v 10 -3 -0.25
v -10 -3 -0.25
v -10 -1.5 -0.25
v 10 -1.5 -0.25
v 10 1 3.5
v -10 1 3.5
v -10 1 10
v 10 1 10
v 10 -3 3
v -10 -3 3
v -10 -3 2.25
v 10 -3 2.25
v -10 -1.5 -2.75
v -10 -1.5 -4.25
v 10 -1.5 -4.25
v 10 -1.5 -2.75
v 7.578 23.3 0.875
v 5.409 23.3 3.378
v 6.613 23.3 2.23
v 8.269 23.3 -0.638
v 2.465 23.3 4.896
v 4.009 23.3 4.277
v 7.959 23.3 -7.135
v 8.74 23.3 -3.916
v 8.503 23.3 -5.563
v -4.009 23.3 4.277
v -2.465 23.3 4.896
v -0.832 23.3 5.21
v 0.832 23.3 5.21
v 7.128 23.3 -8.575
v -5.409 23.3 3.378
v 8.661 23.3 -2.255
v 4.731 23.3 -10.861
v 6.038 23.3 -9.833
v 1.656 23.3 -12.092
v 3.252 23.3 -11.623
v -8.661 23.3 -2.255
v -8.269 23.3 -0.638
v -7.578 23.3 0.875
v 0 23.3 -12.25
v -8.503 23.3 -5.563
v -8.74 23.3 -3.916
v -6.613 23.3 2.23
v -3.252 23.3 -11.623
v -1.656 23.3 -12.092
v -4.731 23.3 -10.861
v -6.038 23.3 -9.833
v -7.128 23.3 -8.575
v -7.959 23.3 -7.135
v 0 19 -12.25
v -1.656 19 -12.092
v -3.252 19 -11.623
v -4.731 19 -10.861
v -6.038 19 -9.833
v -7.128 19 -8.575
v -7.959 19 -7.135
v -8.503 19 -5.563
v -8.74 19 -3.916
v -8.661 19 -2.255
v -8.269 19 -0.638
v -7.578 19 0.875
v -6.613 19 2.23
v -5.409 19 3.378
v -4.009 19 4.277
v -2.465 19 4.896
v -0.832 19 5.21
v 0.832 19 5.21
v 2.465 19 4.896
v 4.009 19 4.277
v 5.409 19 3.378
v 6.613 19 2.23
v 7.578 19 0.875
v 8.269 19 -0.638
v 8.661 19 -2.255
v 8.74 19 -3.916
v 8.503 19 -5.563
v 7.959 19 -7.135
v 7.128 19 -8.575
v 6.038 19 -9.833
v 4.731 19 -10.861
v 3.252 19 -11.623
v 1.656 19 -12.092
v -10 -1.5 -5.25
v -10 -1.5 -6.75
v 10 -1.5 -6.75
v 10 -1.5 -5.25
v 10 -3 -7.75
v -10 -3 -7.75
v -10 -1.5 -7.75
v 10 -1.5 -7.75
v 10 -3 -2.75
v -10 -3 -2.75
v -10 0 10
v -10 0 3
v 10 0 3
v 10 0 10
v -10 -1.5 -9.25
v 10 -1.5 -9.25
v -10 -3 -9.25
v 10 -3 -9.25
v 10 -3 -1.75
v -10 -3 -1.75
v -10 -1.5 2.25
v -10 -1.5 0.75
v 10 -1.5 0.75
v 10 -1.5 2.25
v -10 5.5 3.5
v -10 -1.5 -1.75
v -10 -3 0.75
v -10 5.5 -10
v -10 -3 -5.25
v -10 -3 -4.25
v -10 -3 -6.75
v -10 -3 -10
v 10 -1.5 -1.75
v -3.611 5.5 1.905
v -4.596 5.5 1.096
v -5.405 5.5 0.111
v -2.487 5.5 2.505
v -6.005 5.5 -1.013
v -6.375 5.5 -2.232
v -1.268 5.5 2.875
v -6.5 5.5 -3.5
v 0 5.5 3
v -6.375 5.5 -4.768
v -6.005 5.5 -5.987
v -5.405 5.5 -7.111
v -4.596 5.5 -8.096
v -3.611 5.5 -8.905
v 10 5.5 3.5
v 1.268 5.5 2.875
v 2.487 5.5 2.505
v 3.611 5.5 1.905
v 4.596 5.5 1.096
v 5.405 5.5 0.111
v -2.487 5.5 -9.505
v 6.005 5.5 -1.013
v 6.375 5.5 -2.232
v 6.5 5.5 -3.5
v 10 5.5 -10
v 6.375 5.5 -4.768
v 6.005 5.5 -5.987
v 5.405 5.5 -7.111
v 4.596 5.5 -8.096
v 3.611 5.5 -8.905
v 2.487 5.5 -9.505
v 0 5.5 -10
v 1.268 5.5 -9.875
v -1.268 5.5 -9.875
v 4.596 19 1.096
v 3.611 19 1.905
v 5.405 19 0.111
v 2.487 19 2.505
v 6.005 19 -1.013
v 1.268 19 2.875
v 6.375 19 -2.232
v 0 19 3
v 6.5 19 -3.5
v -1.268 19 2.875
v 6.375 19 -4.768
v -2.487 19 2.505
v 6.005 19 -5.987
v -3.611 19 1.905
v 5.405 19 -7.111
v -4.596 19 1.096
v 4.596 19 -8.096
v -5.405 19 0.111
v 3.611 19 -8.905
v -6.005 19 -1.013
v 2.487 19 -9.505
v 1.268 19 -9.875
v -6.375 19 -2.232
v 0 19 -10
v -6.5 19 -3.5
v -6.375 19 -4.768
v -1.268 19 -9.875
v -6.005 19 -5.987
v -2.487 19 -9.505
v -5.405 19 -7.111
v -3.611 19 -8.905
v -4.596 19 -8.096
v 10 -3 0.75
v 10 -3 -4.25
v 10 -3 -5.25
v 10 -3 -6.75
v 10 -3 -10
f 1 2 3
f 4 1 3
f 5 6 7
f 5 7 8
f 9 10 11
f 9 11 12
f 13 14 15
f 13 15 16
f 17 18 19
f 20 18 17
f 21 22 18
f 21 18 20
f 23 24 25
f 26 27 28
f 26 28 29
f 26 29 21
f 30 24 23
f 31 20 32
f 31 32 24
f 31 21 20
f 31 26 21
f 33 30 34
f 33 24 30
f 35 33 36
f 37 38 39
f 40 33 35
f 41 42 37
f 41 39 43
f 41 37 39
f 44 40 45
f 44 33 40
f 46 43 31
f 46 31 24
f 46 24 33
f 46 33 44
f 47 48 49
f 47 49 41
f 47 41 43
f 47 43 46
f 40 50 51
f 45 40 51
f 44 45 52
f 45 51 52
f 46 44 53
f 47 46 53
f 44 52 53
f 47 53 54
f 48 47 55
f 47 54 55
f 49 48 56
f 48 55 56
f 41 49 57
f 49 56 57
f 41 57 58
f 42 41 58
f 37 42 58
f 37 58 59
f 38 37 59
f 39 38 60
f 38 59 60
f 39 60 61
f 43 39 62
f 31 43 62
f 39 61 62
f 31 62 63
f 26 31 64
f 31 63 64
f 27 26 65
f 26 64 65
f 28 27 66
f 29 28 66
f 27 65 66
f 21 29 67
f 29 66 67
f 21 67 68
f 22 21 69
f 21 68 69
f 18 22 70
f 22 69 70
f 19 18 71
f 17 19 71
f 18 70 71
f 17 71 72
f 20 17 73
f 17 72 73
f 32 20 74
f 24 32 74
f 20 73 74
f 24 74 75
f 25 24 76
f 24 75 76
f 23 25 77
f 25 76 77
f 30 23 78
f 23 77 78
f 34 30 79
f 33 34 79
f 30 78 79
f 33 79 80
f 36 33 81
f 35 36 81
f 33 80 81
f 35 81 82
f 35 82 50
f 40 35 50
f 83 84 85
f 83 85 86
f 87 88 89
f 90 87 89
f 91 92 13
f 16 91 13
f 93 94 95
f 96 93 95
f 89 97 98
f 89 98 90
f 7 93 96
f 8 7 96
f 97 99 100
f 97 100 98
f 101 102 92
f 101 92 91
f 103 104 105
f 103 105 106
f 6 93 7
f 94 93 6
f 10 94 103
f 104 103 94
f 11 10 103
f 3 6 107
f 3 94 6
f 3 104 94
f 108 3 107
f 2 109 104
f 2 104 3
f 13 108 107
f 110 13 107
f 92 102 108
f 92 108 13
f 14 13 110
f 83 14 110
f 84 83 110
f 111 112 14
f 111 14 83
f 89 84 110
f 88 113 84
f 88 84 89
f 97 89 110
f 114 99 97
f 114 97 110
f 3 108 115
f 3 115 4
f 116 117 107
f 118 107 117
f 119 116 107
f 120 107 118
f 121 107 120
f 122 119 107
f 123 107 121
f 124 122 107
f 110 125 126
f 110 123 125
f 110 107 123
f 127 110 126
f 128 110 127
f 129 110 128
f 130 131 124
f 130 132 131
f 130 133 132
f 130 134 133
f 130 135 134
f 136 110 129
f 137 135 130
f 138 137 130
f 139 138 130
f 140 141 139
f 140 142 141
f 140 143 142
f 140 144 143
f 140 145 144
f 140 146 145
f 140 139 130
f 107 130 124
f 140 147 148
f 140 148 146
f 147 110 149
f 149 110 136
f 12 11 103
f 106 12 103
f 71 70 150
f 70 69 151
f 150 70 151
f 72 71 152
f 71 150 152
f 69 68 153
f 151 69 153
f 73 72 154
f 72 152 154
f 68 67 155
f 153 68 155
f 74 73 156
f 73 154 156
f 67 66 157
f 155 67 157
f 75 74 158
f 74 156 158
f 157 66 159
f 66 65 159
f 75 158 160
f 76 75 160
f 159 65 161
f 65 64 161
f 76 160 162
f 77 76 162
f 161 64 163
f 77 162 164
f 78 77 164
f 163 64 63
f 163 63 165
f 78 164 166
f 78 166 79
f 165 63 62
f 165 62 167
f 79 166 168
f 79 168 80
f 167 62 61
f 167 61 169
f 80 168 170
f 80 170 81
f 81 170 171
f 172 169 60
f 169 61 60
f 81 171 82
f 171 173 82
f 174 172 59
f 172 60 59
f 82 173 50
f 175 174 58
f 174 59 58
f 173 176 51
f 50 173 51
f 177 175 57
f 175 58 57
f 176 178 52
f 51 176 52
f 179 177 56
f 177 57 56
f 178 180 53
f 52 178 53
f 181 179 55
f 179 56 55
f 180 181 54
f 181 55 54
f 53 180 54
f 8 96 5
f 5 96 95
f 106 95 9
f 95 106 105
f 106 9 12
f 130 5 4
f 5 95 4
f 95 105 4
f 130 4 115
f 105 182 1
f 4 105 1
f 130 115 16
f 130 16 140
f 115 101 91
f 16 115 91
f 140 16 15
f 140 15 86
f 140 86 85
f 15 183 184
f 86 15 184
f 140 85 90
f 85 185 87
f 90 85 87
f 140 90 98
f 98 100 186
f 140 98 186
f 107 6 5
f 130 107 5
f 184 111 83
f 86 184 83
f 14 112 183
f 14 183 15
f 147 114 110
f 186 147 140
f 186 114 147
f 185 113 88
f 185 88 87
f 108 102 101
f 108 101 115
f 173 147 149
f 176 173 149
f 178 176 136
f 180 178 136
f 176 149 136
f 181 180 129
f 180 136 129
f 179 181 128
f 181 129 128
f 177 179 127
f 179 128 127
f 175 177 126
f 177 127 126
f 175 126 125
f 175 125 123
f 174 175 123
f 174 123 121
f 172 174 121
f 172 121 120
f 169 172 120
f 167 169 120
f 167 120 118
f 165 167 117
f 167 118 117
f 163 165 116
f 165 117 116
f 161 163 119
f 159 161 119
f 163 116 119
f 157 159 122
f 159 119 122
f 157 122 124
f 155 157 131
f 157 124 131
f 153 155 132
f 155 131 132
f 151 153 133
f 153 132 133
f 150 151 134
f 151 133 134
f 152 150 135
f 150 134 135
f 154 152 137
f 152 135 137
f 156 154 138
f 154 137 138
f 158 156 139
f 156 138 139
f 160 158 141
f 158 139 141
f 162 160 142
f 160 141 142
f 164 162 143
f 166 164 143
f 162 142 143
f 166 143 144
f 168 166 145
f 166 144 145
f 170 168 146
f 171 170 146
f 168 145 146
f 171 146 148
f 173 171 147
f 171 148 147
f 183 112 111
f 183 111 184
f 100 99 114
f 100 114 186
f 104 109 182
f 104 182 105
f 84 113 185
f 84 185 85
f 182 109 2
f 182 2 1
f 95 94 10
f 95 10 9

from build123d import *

# Parameters (mm, degrees)
SKETCH1_W             = 20
SKETCH1_H             = 20
PCB_DEPTH             = 1
SKETCH3_W             = 20
SKETCH3_H             = 13
HEATSINK_DEPTH        = 3
SKETCH4_W             = 1.5
SKETCH4_H             = 1.5
HEATSINKPATTERN_DEPTH = 23.561028345
SKETCH5_W             = 20
SKETCH5_H             = 13.5
CAMERABASE_DEPTH      = 4.5
SKETCH6_R             = 6.5
CAMERACYLINDER_DEPTH  = 13.5
SKETCH7_R             = 8.75
LENS_DEPTH            = 4.3


with BuildPart() as part:
    # Sketch1 → PCB (new body)
    with BuildSketch(Plane(origin=(0, 0, 0), x_dir=(1, 0, 0), z_dir=(0, 1, 0))):
        Rectangle(SKETCH1_W, SKETCH1_H)
    extrude(amount=PCB_DEPTH)

    # Sketch3 → HeatSink (add)
    with BuildSketch(Plane.XZ):
        with Locations((0, -3.5)):
            Rectangle(SKETCH3_W, SKETCH3_H)
    extrude(amount=HEATSINK_DEPTH)

    # Sketch4 → HeatSinkPattern (cut, through all)
    with BuildSketch(Plane.ZY.offset(10)):
        with Locations((-1, -2.25)):
            Rectangle(SKETCH4_W, SKETCH4_H)
        with Locations((-3.5, -2.25)):
            Rectangle(SKETCH4_W, SKETCH4_H)
        with Locations((1.5, -2.25)):
            Rectangle(SKETCH4_W, SKETCH4_H)
        with Locations((-6, -2.25)):
            Rectangle(SKETCH4_W, SKETCH4_H)
        with Locations((-8.5, -2.25)):
            Rectangle(SKETCH4_W, SKETCH4_H)
    extrude(amount=-HEATSINKPATTERN_DEPTH, mode=Mode.SUBTRACT)

    # Sketch5 → CameraBase (add)
    with BuildSketch(Plane(origin=(0, 1, 0), x_dir=(1, 0, 0), z_dir=(0, 1, 0))):
        with Locations((0, 3.25)):
            Rectangle(SKETCH5_W, SKETCH5_H)
    extrude(amount=CAMERABASE_DEPTH)

    # Sketch6 → CameraCylinder (add)
    with BuildSketch(Plane(origin=(0, 5.5, 0), x_dir=(1, 0, 0), z_dir=(0, 1, 0))):
        with Locations(Location((0, 3.5, 0), (0, 0, 90))):
            Circle(SKETCH6_R)
    extrude(amount=CAMERACYLINDER_DEPTH)

    # Sketch7 → Lens (add)
    with BuildSketch(Plane(origin=(0, 19, 0), x_dir=(1, 0, 0), z_dir=(0, 1, 0))):
        with Locations(Location((0, 3.5, 0), (0, 0, 90))):
            Circle(SKETCH7_R)
    extrude(amount=LENS_DEPTH)


solid = part.part
